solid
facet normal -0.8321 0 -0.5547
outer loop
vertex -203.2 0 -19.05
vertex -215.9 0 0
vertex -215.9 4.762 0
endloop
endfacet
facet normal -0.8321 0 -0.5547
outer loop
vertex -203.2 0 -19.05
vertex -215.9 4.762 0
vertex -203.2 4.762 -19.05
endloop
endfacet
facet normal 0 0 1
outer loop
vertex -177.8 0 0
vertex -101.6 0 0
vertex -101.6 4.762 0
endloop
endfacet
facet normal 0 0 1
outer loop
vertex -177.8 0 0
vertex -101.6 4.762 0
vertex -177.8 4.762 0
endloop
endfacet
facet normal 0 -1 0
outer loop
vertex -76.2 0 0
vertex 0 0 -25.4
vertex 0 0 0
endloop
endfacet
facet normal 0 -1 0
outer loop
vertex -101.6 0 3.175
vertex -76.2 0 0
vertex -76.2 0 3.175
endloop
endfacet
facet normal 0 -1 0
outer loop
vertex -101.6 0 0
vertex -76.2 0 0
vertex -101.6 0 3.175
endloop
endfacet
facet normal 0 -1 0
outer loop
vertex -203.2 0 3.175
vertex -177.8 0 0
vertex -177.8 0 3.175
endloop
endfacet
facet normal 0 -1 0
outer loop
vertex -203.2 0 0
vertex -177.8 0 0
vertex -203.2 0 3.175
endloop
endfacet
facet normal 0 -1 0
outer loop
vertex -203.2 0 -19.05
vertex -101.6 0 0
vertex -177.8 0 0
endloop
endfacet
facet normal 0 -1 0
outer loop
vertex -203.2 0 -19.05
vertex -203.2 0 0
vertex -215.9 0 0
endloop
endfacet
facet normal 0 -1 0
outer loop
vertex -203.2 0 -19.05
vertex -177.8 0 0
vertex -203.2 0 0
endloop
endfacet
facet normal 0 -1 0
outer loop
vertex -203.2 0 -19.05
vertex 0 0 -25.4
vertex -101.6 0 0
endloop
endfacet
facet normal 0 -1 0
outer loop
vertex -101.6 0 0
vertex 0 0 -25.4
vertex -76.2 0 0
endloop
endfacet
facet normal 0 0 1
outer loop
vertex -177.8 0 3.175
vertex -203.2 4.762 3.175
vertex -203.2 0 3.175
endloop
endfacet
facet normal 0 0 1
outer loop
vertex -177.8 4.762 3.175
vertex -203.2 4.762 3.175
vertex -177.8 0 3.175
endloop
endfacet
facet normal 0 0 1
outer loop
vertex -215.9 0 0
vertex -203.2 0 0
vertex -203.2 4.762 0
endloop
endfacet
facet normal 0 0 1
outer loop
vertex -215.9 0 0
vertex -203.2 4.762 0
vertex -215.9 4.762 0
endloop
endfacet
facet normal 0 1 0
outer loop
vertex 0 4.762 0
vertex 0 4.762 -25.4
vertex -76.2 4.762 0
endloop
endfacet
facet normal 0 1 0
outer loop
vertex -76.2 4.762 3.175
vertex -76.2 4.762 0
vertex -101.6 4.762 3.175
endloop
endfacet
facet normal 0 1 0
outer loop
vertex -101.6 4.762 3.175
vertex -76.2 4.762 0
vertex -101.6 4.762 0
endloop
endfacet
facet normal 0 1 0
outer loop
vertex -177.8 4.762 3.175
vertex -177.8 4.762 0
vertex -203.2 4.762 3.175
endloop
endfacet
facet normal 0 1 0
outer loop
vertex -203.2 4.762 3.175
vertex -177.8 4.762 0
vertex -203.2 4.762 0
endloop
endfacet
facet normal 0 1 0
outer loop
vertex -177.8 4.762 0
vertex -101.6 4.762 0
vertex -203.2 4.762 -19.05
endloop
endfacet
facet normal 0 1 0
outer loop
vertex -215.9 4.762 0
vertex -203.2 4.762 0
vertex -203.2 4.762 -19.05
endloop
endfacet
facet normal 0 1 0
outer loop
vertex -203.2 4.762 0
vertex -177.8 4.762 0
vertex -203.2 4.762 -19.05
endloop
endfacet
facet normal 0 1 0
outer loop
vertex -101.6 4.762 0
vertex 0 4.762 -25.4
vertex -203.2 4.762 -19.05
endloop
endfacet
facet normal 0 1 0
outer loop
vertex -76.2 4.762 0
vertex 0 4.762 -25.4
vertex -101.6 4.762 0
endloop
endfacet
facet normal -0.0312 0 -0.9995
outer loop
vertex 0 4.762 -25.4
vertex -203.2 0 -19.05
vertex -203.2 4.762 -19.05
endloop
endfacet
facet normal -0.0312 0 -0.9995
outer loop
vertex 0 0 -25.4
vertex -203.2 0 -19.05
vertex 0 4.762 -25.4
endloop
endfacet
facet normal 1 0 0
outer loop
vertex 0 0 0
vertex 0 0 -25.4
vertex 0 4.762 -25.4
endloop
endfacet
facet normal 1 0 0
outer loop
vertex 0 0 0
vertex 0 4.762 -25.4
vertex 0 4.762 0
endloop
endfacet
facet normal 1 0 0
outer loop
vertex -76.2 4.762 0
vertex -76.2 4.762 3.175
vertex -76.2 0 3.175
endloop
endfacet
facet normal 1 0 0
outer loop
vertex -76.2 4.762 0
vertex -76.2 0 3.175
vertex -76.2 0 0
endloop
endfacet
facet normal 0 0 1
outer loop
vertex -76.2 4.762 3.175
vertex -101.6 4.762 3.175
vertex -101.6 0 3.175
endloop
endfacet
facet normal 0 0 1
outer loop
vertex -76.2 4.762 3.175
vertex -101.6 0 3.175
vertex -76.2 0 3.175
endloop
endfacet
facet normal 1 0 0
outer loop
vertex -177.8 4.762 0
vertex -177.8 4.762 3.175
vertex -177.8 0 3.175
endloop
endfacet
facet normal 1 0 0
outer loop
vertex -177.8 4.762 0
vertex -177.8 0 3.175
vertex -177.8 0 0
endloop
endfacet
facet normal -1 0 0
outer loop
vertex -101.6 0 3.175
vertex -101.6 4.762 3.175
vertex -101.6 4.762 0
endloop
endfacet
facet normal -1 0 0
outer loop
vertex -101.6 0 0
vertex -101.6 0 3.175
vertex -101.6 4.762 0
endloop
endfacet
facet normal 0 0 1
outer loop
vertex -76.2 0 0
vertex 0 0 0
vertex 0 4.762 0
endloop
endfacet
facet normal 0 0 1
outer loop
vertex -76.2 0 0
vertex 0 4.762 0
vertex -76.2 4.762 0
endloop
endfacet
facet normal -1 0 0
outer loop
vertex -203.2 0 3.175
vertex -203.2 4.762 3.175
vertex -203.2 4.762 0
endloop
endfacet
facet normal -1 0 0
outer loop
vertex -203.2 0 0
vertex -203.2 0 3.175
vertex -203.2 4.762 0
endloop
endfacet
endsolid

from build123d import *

# Parameters (mm, degrees)
BOSS_EXTRUDE1_DEPTH = 4.7625
SKETCH2_W           = 25.4
SKETCH2_H           = 3.175
BOSS_EXTRUDE2_DEPTH = 4.7625


with BuildPart() as part:
    # Sketch1 → Boss-Extrude1 (new body)
    with BuildSketch(Plane(origin=(0, 0, 0), x_dir=(1, 0, 0), z_dir=(0, 1, 0))):
        Polygon((0, 0), (-215.9, 0), (-203.2, 19.05), (0, 25.4), align=None)
    extrude(amount=BOSS_EXTRUDE1_DEPTH)

    # Sketch2 → Boss-Extrude2 (add)
    with BuildSketch(Plane(origin=(0, 4.7625, 0), x_dir=(1, 0, 0), z_dir=(0, 1, 0))):
        with Locations((-190.5, -1.5875)):
            Rectangle(SKETCH2_W, SKETCH2_H)
        with Locations((-88.9, -1.5875)):
            Rectangle(SKETCH2_W, SKETCH2_H)
    extrude(amount=-BOSS_EXTRUDE2_DEPTH)


solid = part.part
